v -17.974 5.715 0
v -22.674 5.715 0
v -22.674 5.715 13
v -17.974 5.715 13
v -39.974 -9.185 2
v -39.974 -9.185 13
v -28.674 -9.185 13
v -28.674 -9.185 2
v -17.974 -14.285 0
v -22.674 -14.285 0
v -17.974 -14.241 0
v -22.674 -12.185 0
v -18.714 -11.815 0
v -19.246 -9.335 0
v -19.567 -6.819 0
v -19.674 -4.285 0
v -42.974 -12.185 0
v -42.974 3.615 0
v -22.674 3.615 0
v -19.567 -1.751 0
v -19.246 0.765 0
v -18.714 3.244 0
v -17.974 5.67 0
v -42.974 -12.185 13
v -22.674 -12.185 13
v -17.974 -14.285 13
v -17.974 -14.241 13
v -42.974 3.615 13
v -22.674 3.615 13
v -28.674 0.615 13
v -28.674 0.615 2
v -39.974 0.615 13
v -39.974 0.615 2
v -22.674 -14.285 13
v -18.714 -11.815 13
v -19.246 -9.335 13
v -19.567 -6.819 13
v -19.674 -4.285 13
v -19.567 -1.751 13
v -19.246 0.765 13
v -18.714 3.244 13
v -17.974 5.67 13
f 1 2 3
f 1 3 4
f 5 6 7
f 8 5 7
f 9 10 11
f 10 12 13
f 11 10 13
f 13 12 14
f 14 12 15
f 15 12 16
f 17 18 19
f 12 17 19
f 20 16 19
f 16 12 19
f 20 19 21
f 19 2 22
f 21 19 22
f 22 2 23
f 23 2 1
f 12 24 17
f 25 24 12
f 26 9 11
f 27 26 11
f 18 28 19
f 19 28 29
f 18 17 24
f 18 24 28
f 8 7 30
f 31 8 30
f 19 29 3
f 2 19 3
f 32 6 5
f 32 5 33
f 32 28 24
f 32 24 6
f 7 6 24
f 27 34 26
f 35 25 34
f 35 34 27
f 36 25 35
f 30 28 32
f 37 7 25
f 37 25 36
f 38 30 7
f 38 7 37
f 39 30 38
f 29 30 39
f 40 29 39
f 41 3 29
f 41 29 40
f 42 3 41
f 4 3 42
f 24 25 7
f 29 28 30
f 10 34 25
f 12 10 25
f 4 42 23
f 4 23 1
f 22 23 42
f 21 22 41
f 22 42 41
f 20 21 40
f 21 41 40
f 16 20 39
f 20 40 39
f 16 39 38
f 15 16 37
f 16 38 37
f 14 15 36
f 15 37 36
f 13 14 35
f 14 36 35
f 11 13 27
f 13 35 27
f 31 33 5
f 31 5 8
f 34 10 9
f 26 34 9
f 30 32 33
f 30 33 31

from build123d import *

# Parameters (mm, degrees)
F0_W     = 25
F0_H     = 20
F1_DEPTH = 13
F2_W     = 11.3
F2_H     = 9.8
F3_DEPTH = 11
F4_W     = 20.3
F4_H     = 2.1
F5_DEPTH = 25
F6_R     = 30
F7_DEPTH = 25


with BuildPart() as f1:
    # F0 (on Top) → F1 (new body)
    with BuildSketch(Plane.XY):
        with Locations((-30.473944, -4.285119)):
            Rectangle(F0_W, F0_H)
    extrude(amount=F1_DEPTH)

    # F2 (on face) → F3 (cut)
    with BuildSketch(Plane.XY.offset(13)):
        with Locations((-34.323944, -4.285119)):
            Rectangle(F2_W, F2_H)
    extrude(amount=-F3_DEPTH, mode=Mode.SUBTRACT)

    # F4 (on face) → F5 (cut)
    with BuildSketch(Plane.XY.offset(13)):
        with Locations((-32.823944, 4.664881)):
            Rectangle(F4_W, F4_H)
        with Locations((-32.823944, -13.235119)):
            Rectangle(F4_W, F4_H)
    extrude(amount=-F5_DEPTH, mode=Mode.SUBTRACT)

    # F6 (on face) → F7 (cut)
    with BuildSketch(Plane.XY.offset(13)):
        with Locations((10.326056, -4.285119)):
            Circle(F6_R)
    extrude(amount=-F7_DEPTH, mode=Mode.SUBTRACT)


solid = f1.part
